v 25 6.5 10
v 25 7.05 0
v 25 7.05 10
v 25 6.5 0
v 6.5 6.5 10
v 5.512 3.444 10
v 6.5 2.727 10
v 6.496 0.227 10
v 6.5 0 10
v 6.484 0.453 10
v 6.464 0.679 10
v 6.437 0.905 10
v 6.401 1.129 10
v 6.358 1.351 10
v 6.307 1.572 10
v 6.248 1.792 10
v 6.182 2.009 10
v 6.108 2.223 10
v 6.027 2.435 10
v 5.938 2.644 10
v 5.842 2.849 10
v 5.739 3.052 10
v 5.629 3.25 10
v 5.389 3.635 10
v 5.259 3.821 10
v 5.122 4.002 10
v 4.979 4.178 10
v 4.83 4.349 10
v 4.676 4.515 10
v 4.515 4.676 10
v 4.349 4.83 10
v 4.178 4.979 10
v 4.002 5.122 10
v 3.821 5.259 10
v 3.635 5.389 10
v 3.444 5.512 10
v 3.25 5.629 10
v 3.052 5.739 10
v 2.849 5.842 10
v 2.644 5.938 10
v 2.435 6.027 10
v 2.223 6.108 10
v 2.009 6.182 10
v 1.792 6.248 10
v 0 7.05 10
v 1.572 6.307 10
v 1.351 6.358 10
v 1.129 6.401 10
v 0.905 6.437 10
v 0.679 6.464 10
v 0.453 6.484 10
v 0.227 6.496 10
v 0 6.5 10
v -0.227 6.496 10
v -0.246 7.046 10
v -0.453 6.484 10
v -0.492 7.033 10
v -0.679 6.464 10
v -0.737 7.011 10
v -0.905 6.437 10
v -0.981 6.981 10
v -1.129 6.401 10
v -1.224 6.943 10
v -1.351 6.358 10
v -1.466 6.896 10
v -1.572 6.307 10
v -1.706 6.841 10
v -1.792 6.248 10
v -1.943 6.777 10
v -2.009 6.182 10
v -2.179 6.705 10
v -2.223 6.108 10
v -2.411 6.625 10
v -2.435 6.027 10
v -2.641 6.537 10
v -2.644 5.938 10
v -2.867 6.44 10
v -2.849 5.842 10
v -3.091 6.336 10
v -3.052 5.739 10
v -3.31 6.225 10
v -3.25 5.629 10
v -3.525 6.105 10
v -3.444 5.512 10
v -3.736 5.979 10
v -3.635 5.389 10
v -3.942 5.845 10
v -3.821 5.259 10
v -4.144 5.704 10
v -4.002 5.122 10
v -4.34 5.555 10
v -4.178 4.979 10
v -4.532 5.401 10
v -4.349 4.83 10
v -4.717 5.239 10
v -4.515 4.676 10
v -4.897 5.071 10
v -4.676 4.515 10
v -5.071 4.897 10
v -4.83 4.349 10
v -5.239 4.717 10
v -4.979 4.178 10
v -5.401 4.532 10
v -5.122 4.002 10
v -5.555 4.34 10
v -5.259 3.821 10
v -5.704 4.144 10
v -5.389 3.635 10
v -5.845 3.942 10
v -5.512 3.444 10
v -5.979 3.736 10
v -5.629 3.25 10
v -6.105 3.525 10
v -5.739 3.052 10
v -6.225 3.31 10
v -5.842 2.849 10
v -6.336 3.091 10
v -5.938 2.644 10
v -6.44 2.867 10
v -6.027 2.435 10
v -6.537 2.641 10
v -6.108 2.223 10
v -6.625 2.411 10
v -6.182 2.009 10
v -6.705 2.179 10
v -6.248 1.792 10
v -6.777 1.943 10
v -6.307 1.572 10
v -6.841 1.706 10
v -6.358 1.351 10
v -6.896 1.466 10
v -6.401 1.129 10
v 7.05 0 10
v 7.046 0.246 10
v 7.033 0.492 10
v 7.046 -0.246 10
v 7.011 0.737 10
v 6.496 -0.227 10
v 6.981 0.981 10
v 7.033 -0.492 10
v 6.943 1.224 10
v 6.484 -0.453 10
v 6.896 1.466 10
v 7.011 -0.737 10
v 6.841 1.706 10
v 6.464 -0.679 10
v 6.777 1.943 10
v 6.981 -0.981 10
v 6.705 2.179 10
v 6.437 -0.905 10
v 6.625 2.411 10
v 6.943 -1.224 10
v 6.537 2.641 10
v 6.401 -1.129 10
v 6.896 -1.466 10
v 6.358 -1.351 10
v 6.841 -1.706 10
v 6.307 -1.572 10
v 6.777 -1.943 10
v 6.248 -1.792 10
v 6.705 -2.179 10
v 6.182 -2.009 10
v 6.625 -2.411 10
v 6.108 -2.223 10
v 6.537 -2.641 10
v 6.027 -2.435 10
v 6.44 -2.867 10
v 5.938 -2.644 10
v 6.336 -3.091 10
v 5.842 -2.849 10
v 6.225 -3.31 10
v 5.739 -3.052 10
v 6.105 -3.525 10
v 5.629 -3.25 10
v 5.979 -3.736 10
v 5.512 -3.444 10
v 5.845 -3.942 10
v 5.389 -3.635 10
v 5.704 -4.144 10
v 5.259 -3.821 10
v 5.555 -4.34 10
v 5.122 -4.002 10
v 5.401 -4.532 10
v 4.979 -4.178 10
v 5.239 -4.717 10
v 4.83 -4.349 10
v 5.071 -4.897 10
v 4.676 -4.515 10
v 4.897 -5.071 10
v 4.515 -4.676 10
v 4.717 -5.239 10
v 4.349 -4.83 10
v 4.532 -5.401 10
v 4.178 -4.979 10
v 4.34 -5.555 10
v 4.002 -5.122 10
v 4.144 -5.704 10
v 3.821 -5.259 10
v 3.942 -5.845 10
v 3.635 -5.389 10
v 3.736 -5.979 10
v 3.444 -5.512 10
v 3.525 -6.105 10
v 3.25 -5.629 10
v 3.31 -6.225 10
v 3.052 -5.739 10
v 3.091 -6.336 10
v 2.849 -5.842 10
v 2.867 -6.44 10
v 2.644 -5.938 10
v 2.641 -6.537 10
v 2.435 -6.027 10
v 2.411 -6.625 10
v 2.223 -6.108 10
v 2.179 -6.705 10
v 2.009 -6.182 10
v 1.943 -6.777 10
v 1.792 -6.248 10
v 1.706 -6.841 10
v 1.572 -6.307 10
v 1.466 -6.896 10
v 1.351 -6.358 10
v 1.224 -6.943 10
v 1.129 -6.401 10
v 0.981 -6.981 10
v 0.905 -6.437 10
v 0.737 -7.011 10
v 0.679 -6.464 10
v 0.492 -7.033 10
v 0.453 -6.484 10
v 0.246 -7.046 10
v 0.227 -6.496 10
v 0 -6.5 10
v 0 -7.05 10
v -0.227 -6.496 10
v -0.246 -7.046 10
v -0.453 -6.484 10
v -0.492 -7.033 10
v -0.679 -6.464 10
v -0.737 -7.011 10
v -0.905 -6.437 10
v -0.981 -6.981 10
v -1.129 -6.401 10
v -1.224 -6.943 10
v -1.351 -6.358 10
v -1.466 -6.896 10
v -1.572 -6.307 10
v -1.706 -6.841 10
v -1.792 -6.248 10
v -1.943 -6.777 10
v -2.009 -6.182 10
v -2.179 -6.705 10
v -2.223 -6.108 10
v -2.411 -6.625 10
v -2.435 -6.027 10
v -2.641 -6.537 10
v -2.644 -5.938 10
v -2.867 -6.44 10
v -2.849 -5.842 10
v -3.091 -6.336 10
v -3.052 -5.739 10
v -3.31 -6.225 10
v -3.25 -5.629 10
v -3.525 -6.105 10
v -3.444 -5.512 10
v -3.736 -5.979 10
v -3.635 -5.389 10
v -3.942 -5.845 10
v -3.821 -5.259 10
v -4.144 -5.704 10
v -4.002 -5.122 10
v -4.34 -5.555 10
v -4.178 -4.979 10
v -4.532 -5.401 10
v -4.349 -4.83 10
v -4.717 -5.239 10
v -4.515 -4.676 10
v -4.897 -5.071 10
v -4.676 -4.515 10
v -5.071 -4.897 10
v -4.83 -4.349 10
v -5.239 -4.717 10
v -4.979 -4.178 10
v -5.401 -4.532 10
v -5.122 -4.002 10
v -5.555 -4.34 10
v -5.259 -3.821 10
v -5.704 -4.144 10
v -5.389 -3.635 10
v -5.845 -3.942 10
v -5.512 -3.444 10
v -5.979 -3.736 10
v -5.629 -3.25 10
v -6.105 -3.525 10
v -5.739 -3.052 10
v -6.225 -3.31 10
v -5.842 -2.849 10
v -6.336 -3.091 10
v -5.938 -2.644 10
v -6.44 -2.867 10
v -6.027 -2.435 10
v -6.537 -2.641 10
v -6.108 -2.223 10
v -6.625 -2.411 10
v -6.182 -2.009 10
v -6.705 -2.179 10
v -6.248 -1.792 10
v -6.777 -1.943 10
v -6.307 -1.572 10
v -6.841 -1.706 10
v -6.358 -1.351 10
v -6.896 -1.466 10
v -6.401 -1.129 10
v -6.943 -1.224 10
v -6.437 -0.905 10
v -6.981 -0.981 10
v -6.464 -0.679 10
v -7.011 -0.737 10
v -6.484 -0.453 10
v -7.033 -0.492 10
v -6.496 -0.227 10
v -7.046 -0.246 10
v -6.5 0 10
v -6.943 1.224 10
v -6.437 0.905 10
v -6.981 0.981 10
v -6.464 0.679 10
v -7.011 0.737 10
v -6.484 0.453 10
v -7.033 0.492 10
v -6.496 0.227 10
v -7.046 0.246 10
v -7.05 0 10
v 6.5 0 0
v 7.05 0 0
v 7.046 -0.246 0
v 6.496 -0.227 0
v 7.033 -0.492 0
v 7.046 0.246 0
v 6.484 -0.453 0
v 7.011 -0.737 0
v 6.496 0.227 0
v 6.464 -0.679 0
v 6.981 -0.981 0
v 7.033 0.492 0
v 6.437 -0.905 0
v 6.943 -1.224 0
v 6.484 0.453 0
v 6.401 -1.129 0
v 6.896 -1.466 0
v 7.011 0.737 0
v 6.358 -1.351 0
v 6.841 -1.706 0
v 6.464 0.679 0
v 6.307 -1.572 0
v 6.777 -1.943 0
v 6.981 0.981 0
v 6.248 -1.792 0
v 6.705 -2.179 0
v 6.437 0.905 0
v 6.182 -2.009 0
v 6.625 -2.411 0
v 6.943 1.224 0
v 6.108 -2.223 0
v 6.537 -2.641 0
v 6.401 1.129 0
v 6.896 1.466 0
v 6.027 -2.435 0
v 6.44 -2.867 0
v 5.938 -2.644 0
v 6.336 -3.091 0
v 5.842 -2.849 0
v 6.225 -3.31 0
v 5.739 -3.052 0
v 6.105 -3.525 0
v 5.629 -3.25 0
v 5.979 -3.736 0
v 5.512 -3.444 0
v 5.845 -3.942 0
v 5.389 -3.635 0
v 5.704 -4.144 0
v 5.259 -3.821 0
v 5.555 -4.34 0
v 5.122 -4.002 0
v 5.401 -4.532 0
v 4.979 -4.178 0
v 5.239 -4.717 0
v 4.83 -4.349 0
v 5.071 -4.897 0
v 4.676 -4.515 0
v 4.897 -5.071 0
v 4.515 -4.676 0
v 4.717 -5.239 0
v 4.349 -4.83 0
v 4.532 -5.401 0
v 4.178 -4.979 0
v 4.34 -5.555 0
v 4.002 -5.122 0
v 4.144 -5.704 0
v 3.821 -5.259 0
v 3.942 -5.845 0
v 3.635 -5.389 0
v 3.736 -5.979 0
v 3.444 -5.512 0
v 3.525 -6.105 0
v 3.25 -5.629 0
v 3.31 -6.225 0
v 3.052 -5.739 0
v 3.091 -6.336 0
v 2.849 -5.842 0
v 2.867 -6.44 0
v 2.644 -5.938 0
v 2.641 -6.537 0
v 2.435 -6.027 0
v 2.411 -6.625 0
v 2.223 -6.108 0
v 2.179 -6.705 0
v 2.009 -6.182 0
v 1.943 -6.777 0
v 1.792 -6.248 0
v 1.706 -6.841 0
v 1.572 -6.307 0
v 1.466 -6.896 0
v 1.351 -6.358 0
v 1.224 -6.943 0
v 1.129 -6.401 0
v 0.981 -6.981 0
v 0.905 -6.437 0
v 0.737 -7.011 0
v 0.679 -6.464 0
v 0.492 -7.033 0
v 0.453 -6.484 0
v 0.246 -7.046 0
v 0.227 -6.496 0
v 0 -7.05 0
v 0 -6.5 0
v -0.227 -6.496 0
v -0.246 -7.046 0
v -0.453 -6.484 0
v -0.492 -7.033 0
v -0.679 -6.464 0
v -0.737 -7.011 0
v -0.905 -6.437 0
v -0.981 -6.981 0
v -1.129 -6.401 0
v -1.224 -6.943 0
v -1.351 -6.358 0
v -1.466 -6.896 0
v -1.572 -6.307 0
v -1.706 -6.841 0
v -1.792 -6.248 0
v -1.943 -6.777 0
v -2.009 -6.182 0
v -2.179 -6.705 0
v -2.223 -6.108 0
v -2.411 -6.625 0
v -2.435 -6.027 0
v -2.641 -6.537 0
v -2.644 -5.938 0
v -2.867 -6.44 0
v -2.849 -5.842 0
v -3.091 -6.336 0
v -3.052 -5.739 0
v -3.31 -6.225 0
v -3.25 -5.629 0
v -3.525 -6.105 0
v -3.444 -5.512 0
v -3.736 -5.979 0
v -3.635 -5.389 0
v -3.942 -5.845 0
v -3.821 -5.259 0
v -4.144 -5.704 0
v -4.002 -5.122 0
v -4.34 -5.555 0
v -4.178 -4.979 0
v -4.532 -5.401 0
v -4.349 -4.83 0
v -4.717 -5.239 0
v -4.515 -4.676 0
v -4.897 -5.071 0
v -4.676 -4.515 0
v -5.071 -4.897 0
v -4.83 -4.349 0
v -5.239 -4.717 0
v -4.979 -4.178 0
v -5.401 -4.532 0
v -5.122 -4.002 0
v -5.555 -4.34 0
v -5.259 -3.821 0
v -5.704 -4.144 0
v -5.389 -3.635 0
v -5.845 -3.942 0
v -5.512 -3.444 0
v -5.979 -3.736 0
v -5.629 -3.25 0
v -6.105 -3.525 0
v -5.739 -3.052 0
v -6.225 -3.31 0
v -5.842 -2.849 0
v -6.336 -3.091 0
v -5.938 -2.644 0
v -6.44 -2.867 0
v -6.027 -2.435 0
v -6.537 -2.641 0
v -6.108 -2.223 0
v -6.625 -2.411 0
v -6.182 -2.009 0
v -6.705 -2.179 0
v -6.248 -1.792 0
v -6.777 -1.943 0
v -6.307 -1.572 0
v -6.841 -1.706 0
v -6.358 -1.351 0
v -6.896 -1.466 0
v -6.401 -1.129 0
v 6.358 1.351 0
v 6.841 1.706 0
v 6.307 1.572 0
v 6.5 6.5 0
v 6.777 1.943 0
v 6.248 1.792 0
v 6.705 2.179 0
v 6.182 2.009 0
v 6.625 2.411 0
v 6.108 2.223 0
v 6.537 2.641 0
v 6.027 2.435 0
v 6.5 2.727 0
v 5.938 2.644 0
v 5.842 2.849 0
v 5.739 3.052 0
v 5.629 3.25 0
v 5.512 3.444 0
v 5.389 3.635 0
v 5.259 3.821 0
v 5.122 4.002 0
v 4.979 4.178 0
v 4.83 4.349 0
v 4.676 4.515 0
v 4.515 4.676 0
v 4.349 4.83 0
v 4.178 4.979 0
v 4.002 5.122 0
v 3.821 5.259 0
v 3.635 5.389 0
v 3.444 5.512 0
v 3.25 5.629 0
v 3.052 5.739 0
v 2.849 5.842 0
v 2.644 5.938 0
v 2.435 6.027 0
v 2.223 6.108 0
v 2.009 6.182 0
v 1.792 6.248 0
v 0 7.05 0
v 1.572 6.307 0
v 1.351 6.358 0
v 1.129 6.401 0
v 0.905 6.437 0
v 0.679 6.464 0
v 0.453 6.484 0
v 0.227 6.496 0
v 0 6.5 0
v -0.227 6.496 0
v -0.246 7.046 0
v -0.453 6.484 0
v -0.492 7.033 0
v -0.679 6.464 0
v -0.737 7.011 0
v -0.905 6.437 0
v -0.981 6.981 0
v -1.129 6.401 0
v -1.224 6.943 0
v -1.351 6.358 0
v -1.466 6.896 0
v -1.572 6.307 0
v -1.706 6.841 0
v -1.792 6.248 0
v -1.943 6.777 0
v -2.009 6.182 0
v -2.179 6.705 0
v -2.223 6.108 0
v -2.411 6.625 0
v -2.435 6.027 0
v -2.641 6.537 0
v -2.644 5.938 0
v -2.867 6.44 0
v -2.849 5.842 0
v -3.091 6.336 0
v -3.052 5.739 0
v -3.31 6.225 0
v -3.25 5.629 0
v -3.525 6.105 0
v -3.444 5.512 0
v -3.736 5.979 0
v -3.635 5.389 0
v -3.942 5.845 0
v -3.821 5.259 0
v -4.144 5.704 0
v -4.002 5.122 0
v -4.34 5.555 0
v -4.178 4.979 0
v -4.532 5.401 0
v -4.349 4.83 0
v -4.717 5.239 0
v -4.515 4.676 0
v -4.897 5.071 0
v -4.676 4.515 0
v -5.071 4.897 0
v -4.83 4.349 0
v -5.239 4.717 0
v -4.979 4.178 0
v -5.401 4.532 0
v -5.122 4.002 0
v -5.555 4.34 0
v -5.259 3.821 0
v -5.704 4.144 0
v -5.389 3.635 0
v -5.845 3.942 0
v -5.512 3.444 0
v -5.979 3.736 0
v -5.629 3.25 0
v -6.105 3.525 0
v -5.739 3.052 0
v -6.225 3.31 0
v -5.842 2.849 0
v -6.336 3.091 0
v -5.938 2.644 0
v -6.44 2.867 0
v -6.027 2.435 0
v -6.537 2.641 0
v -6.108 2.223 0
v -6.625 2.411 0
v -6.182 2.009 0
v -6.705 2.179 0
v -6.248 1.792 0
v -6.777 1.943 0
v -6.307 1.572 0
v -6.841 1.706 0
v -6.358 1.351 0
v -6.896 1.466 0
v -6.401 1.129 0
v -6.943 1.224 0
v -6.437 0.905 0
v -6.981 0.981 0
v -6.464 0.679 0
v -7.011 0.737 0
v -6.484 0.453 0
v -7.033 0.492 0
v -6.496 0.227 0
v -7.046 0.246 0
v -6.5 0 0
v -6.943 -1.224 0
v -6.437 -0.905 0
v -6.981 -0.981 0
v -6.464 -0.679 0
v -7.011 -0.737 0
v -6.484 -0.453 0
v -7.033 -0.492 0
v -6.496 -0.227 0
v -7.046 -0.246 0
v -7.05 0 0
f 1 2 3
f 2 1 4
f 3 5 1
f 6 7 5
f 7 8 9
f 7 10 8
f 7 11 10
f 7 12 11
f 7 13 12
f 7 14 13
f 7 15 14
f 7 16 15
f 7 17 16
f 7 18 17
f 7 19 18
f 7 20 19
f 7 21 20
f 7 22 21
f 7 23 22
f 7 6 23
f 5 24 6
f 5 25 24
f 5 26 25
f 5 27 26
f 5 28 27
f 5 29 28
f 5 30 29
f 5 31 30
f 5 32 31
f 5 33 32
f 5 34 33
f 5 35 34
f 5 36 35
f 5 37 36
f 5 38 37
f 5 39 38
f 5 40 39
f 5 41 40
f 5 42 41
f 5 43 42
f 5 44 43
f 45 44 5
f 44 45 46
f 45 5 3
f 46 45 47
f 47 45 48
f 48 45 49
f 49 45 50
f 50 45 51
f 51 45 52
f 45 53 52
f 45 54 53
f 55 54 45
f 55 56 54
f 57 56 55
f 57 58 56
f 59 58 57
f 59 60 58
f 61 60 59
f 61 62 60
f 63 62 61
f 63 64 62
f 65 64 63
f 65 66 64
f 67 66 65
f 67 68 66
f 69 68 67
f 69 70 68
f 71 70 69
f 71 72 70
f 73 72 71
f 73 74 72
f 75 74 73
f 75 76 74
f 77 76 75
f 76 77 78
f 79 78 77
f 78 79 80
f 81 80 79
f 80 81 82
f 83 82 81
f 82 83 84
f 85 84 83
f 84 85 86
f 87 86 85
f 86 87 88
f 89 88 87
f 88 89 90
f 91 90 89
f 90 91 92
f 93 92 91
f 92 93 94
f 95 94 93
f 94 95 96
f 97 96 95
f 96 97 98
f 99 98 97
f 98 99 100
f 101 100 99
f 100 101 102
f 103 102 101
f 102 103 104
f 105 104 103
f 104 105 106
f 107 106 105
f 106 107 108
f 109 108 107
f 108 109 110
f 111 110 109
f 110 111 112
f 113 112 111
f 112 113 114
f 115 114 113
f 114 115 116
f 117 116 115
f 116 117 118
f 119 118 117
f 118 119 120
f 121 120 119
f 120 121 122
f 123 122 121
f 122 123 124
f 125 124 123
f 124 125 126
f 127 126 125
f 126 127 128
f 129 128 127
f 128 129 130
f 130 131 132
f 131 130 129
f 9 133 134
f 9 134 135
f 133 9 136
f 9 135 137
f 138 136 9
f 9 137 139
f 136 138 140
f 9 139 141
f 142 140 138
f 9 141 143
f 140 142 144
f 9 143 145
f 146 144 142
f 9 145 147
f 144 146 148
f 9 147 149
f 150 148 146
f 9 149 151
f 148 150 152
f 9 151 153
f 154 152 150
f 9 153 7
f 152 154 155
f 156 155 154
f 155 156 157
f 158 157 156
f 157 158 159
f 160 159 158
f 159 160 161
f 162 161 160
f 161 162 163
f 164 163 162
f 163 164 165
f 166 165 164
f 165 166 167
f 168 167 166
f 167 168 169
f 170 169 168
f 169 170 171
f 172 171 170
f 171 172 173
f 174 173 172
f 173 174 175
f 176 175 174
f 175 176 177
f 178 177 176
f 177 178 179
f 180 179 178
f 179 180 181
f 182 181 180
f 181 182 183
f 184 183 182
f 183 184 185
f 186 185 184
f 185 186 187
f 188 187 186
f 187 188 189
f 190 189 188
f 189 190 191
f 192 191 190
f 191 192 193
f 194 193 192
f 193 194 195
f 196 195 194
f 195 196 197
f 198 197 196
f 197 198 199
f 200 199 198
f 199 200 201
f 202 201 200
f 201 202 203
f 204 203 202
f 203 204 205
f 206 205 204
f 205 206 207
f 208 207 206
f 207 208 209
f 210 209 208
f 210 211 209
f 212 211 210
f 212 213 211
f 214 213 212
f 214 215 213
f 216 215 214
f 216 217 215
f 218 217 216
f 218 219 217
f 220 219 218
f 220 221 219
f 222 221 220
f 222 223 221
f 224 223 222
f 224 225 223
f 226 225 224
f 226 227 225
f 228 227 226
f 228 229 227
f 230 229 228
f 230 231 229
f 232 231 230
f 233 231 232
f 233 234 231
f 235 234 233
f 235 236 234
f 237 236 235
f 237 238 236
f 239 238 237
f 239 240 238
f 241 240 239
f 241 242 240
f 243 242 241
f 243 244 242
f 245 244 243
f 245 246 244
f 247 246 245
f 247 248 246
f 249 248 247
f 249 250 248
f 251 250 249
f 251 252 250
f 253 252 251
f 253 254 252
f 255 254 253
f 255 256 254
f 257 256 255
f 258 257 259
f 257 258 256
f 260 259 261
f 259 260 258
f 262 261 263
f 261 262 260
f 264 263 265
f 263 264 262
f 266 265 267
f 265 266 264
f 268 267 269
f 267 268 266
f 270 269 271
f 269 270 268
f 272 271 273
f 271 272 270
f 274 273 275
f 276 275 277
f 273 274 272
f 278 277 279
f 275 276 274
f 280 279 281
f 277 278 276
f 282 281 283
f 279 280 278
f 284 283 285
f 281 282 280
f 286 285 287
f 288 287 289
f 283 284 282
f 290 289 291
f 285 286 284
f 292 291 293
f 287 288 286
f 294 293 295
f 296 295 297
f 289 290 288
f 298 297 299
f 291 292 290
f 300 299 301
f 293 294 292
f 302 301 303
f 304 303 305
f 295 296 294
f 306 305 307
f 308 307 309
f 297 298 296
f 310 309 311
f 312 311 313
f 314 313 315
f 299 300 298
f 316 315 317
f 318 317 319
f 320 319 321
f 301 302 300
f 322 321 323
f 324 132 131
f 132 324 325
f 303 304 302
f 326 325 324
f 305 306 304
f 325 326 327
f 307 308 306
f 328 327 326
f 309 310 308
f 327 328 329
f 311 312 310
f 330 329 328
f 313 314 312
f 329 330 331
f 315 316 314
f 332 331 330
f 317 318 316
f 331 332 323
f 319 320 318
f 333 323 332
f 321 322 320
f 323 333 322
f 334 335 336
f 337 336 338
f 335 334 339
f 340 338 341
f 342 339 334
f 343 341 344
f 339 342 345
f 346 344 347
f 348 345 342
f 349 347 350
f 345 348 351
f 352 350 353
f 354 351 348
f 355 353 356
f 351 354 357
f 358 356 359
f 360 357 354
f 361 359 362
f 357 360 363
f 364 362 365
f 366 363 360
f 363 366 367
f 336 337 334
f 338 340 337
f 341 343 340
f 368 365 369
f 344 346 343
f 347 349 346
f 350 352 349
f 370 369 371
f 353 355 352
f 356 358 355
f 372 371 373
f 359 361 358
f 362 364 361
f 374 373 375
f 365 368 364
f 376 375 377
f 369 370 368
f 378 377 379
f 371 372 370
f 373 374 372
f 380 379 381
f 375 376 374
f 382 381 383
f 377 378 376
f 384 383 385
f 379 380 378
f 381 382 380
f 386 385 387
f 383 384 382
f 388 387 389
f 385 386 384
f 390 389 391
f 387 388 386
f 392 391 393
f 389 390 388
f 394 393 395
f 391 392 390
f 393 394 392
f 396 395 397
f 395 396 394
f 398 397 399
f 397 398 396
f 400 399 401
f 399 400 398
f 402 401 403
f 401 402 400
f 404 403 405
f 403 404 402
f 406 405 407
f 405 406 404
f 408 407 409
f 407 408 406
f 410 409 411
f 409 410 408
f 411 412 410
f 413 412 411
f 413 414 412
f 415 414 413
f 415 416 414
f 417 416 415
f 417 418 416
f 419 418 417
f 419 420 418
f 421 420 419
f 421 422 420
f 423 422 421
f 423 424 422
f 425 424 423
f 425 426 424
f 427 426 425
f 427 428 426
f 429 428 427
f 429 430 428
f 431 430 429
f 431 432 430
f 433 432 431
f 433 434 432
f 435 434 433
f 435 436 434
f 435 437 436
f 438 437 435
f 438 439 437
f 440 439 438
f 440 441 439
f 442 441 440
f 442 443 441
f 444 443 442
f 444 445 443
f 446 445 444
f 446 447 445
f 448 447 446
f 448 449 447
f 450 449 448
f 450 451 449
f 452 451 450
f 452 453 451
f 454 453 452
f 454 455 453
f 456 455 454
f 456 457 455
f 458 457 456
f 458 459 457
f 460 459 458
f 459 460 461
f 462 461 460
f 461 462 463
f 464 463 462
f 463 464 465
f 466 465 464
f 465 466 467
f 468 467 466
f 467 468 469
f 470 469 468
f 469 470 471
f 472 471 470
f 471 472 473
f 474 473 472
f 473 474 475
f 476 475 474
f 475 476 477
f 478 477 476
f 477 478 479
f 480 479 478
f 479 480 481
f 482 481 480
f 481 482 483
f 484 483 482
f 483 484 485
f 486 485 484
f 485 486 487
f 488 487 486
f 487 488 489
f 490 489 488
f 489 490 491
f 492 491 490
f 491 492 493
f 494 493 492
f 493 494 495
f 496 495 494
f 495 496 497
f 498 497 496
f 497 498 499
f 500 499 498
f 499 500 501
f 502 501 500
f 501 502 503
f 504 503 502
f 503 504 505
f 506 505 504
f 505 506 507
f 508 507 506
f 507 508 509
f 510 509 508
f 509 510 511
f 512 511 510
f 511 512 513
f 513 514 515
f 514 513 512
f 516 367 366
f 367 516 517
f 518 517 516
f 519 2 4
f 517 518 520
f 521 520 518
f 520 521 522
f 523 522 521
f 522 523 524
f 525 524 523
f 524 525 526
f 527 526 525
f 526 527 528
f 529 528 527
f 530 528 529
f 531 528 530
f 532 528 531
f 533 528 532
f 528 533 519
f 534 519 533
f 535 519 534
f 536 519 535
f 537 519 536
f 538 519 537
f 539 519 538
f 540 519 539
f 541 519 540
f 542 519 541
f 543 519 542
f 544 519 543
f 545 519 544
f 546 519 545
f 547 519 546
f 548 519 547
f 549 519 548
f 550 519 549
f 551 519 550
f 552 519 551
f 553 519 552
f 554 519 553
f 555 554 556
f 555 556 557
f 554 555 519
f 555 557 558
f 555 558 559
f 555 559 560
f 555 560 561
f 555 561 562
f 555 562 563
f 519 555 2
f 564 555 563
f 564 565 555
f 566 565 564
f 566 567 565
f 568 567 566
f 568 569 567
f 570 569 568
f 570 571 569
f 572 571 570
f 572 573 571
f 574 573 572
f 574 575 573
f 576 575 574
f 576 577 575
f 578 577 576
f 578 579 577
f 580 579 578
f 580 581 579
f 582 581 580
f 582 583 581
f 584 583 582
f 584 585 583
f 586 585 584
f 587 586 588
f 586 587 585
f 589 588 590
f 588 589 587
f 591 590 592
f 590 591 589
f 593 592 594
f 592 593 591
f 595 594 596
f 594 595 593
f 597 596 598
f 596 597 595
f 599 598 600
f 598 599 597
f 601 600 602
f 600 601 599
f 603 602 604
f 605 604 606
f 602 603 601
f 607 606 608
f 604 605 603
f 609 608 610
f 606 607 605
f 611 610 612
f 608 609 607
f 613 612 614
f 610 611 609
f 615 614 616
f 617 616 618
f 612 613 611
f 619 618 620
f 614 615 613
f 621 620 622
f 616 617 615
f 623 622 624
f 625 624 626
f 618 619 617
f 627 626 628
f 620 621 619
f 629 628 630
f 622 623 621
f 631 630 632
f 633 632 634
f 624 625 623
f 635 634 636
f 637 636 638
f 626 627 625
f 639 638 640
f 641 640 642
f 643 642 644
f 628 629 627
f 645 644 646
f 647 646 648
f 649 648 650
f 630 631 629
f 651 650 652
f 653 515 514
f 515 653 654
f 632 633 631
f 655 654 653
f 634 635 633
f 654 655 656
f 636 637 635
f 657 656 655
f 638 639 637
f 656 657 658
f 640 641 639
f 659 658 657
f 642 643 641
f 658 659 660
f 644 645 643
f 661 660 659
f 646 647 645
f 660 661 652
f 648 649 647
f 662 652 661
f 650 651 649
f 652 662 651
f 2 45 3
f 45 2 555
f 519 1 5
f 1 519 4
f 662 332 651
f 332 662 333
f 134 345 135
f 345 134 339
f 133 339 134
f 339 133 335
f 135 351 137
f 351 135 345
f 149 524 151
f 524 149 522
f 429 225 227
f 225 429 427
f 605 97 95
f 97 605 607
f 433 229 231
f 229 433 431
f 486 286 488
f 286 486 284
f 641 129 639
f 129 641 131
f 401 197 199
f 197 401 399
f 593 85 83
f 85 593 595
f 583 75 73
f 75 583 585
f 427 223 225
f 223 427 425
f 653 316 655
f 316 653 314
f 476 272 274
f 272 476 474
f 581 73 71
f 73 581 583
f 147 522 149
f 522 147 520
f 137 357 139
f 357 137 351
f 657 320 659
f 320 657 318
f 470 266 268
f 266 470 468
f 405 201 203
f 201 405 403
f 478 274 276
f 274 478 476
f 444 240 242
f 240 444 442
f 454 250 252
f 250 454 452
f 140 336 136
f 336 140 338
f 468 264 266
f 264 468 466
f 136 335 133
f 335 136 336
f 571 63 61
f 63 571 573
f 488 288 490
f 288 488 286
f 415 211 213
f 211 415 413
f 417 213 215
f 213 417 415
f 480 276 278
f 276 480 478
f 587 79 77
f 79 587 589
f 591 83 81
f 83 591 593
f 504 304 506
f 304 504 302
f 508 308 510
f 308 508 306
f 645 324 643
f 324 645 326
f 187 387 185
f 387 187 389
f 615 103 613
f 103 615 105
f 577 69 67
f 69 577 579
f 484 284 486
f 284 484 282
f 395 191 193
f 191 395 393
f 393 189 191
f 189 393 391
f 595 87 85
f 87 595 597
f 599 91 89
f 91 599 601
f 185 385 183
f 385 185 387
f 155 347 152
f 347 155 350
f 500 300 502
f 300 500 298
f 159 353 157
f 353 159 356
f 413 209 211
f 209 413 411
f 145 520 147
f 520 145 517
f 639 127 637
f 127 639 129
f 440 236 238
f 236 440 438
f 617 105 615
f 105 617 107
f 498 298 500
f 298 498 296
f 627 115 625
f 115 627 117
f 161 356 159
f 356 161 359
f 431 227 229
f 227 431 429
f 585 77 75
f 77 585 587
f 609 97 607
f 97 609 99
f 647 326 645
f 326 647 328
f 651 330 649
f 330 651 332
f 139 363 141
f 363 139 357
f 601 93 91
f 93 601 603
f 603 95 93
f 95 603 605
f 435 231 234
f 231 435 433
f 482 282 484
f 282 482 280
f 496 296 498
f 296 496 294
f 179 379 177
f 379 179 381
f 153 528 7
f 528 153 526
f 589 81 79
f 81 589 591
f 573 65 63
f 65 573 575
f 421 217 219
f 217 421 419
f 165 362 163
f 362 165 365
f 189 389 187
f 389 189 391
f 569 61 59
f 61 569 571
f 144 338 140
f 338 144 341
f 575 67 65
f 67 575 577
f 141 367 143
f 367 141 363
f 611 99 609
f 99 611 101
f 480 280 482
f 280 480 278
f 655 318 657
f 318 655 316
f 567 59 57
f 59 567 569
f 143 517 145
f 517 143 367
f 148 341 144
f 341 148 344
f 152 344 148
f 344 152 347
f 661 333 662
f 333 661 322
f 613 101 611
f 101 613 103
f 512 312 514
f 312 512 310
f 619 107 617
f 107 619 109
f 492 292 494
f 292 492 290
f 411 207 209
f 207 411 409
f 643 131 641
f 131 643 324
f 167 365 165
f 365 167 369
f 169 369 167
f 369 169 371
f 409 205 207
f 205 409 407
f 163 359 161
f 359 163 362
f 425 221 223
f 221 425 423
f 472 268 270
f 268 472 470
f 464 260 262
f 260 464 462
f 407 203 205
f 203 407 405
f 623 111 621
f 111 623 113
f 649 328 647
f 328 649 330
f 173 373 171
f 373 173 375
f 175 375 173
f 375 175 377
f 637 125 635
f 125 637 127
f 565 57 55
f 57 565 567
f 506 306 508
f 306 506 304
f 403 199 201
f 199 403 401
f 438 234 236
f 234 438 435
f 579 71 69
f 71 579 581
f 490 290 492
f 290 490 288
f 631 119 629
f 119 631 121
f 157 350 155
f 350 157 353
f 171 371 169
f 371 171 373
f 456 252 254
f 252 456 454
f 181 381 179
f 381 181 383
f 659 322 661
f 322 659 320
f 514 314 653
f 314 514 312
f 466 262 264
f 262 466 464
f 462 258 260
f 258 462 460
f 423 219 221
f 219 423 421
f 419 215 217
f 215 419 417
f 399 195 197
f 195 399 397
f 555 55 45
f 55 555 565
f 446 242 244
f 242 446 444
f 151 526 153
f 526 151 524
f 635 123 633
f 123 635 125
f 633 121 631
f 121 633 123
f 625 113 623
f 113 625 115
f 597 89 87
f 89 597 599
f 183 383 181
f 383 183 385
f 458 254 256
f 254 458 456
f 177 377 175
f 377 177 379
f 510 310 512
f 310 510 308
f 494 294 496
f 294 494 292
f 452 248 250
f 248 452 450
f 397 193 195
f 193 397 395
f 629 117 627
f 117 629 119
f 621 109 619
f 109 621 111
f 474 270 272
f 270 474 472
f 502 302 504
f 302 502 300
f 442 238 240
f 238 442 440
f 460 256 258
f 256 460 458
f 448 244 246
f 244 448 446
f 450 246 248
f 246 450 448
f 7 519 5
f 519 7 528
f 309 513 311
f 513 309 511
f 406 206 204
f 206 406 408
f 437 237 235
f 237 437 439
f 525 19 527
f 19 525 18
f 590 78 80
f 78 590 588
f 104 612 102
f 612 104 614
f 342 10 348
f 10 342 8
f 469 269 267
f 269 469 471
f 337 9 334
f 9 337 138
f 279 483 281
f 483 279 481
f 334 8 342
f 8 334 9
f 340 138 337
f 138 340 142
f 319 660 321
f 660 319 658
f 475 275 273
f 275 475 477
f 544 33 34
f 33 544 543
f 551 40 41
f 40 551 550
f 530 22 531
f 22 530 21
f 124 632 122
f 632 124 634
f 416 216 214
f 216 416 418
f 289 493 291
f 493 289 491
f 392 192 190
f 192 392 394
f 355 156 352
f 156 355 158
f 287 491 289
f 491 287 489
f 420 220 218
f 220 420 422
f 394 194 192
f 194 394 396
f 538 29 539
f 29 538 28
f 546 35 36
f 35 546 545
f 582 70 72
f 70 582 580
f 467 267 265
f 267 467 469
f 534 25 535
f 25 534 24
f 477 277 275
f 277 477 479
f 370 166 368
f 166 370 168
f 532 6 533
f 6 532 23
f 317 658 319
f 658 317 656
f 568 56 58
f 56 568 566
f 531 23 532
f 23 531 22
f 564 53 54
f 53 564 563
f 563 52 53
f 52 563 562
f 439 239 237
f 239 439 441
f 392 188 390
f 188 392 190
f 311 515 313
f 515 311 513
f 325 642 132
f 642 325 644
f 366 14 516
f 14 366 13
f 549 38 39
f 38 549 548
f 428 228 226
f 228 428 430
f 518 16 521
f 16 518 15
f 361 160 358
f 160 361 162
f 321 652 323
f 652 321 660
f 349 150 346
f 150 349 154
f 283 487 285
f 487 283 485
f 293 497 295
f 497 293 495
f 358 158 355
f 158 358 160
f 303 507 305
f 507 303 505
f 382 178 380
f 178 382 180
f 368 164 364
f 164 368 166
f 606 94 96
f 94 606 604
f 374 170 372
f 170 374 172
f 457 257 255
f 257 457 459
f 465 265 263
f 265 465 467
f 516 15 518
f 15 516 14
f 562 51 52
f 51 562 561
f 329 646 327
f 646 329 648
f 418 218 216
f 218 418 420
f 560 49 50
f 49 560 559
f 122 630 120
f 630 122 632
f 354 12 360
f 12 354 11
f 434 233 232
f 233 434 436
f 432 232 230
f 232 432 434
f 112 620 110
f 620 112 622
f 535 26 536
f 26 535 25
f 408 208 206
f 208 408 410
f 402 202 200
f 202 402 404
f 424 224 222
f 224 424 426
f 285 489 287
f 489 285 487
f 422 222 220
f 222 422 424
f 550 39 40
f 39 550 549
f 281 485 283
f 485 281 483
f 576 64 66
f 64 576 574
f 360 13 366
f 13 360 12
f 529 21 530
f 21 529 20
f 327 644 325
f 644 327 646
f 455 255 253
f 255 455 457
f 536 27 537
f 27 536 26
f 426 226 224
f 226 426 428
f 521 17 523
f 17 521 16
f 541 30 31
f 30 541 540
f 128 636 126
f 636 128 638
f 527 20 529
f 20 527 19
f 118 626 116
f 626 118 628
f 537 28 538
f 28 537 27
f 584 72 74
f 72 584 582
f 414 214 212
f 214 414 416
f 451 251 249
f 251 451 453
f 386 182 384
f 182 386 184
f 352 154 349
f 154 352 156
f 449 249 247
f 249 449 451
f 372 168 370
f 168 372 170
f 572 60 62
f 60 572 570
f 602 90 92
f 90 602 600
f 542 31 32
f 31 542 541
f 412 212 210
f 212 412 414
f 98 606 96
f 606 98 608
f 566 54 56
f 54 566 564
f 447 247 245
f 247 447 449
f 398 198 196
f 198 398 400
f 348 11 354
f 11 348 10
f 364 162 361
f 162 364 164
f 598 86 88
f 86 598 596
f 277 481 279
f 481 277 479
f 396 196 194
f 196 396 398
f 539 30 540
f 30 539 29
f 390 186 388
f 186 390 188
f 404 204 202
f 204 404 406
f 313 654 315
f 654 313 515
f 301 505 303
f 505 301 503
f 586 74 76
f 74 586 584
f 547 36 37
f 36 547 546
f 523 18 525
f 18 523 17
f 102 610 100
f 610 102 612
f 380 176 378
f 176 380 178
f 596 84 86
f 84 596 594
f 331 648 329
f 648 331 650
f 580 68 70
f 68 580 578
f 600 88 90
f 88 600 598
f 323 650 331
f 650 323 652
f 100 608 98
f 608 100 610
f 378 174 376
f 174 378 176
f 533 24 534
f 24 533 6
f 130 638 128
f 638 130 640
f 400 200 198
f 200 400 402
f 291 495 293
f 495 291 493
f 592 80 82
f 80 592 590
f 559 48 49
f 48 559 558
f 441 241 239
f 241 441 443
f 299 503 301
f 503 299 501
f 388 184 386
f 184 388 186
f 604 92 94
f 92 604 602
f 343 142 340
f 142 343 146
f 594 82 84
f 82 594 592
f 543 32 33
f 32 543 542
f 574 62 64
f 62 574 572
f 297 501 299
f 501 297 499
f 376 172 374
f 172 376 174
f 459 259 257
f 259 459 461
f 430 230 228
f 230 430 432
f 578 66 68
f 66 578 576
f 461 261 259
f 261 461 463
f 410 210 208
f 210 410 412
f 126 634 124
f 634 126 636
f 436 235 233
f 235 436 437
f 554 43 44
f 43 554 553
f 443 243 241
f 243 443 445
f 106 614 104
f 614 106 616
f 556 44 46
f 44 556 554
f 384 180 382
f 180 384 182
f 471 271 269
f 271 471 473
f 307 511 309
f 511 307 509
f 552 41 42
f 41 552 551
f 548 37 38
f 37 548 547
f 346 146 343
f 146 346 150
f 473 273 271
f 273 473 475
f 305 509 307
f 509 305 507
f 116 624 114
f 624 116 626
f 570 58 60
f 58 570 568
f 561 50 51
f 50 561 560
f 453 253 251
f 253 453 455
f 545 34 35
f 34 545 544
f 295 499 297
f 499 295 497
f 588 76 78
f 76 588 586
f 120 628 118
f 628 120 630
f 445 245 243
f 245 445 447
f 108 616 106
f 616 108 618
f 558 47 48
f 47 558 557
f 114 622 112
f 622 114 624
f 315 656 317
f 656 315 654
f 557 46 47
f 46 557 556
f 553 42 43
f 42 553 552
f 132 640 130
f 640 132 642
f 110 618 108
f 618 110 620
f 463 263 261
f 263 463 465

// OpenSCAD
//Copyright Hsiao-yu Chen 2016

//Pen Loop, Style 1



//model for a simple pen loop for notebooks and journals.
//
// Designed for mounting on first or last pages of a notebook.
//

//example for LAMY Safari fountain pens:
//
//height=20;
//inner_dia = 15;
//thickness = 1.3;
//tab_width = 25;
//


module pen_loop_1(height, inner_dia, thickness, tab_width, smoothness = 180){
    radius = inner_dia / 2.0;
    

    difference(){
        union () {
            //a tab to attach to paper
            translate([0, radius, 0])
                cube(size =[tab_width, thickness / 2.0, height]);
      
            //main body cylindar
            cylinder($fn=smoothness, h=height, d=inner_dia+thickness);
            
            //fillet
            translate([0,0 ,0]) cube(size=[radius, inner_dia / 2.0, height]);
        }; //union
        
        //hallow out inner_diameter cylindar
        cylinder($fn=smoothness,  h=height, d=inner_dia);
        };
} //module
        



pen_loop_1(10, 13, 1.1, 25, 180);
